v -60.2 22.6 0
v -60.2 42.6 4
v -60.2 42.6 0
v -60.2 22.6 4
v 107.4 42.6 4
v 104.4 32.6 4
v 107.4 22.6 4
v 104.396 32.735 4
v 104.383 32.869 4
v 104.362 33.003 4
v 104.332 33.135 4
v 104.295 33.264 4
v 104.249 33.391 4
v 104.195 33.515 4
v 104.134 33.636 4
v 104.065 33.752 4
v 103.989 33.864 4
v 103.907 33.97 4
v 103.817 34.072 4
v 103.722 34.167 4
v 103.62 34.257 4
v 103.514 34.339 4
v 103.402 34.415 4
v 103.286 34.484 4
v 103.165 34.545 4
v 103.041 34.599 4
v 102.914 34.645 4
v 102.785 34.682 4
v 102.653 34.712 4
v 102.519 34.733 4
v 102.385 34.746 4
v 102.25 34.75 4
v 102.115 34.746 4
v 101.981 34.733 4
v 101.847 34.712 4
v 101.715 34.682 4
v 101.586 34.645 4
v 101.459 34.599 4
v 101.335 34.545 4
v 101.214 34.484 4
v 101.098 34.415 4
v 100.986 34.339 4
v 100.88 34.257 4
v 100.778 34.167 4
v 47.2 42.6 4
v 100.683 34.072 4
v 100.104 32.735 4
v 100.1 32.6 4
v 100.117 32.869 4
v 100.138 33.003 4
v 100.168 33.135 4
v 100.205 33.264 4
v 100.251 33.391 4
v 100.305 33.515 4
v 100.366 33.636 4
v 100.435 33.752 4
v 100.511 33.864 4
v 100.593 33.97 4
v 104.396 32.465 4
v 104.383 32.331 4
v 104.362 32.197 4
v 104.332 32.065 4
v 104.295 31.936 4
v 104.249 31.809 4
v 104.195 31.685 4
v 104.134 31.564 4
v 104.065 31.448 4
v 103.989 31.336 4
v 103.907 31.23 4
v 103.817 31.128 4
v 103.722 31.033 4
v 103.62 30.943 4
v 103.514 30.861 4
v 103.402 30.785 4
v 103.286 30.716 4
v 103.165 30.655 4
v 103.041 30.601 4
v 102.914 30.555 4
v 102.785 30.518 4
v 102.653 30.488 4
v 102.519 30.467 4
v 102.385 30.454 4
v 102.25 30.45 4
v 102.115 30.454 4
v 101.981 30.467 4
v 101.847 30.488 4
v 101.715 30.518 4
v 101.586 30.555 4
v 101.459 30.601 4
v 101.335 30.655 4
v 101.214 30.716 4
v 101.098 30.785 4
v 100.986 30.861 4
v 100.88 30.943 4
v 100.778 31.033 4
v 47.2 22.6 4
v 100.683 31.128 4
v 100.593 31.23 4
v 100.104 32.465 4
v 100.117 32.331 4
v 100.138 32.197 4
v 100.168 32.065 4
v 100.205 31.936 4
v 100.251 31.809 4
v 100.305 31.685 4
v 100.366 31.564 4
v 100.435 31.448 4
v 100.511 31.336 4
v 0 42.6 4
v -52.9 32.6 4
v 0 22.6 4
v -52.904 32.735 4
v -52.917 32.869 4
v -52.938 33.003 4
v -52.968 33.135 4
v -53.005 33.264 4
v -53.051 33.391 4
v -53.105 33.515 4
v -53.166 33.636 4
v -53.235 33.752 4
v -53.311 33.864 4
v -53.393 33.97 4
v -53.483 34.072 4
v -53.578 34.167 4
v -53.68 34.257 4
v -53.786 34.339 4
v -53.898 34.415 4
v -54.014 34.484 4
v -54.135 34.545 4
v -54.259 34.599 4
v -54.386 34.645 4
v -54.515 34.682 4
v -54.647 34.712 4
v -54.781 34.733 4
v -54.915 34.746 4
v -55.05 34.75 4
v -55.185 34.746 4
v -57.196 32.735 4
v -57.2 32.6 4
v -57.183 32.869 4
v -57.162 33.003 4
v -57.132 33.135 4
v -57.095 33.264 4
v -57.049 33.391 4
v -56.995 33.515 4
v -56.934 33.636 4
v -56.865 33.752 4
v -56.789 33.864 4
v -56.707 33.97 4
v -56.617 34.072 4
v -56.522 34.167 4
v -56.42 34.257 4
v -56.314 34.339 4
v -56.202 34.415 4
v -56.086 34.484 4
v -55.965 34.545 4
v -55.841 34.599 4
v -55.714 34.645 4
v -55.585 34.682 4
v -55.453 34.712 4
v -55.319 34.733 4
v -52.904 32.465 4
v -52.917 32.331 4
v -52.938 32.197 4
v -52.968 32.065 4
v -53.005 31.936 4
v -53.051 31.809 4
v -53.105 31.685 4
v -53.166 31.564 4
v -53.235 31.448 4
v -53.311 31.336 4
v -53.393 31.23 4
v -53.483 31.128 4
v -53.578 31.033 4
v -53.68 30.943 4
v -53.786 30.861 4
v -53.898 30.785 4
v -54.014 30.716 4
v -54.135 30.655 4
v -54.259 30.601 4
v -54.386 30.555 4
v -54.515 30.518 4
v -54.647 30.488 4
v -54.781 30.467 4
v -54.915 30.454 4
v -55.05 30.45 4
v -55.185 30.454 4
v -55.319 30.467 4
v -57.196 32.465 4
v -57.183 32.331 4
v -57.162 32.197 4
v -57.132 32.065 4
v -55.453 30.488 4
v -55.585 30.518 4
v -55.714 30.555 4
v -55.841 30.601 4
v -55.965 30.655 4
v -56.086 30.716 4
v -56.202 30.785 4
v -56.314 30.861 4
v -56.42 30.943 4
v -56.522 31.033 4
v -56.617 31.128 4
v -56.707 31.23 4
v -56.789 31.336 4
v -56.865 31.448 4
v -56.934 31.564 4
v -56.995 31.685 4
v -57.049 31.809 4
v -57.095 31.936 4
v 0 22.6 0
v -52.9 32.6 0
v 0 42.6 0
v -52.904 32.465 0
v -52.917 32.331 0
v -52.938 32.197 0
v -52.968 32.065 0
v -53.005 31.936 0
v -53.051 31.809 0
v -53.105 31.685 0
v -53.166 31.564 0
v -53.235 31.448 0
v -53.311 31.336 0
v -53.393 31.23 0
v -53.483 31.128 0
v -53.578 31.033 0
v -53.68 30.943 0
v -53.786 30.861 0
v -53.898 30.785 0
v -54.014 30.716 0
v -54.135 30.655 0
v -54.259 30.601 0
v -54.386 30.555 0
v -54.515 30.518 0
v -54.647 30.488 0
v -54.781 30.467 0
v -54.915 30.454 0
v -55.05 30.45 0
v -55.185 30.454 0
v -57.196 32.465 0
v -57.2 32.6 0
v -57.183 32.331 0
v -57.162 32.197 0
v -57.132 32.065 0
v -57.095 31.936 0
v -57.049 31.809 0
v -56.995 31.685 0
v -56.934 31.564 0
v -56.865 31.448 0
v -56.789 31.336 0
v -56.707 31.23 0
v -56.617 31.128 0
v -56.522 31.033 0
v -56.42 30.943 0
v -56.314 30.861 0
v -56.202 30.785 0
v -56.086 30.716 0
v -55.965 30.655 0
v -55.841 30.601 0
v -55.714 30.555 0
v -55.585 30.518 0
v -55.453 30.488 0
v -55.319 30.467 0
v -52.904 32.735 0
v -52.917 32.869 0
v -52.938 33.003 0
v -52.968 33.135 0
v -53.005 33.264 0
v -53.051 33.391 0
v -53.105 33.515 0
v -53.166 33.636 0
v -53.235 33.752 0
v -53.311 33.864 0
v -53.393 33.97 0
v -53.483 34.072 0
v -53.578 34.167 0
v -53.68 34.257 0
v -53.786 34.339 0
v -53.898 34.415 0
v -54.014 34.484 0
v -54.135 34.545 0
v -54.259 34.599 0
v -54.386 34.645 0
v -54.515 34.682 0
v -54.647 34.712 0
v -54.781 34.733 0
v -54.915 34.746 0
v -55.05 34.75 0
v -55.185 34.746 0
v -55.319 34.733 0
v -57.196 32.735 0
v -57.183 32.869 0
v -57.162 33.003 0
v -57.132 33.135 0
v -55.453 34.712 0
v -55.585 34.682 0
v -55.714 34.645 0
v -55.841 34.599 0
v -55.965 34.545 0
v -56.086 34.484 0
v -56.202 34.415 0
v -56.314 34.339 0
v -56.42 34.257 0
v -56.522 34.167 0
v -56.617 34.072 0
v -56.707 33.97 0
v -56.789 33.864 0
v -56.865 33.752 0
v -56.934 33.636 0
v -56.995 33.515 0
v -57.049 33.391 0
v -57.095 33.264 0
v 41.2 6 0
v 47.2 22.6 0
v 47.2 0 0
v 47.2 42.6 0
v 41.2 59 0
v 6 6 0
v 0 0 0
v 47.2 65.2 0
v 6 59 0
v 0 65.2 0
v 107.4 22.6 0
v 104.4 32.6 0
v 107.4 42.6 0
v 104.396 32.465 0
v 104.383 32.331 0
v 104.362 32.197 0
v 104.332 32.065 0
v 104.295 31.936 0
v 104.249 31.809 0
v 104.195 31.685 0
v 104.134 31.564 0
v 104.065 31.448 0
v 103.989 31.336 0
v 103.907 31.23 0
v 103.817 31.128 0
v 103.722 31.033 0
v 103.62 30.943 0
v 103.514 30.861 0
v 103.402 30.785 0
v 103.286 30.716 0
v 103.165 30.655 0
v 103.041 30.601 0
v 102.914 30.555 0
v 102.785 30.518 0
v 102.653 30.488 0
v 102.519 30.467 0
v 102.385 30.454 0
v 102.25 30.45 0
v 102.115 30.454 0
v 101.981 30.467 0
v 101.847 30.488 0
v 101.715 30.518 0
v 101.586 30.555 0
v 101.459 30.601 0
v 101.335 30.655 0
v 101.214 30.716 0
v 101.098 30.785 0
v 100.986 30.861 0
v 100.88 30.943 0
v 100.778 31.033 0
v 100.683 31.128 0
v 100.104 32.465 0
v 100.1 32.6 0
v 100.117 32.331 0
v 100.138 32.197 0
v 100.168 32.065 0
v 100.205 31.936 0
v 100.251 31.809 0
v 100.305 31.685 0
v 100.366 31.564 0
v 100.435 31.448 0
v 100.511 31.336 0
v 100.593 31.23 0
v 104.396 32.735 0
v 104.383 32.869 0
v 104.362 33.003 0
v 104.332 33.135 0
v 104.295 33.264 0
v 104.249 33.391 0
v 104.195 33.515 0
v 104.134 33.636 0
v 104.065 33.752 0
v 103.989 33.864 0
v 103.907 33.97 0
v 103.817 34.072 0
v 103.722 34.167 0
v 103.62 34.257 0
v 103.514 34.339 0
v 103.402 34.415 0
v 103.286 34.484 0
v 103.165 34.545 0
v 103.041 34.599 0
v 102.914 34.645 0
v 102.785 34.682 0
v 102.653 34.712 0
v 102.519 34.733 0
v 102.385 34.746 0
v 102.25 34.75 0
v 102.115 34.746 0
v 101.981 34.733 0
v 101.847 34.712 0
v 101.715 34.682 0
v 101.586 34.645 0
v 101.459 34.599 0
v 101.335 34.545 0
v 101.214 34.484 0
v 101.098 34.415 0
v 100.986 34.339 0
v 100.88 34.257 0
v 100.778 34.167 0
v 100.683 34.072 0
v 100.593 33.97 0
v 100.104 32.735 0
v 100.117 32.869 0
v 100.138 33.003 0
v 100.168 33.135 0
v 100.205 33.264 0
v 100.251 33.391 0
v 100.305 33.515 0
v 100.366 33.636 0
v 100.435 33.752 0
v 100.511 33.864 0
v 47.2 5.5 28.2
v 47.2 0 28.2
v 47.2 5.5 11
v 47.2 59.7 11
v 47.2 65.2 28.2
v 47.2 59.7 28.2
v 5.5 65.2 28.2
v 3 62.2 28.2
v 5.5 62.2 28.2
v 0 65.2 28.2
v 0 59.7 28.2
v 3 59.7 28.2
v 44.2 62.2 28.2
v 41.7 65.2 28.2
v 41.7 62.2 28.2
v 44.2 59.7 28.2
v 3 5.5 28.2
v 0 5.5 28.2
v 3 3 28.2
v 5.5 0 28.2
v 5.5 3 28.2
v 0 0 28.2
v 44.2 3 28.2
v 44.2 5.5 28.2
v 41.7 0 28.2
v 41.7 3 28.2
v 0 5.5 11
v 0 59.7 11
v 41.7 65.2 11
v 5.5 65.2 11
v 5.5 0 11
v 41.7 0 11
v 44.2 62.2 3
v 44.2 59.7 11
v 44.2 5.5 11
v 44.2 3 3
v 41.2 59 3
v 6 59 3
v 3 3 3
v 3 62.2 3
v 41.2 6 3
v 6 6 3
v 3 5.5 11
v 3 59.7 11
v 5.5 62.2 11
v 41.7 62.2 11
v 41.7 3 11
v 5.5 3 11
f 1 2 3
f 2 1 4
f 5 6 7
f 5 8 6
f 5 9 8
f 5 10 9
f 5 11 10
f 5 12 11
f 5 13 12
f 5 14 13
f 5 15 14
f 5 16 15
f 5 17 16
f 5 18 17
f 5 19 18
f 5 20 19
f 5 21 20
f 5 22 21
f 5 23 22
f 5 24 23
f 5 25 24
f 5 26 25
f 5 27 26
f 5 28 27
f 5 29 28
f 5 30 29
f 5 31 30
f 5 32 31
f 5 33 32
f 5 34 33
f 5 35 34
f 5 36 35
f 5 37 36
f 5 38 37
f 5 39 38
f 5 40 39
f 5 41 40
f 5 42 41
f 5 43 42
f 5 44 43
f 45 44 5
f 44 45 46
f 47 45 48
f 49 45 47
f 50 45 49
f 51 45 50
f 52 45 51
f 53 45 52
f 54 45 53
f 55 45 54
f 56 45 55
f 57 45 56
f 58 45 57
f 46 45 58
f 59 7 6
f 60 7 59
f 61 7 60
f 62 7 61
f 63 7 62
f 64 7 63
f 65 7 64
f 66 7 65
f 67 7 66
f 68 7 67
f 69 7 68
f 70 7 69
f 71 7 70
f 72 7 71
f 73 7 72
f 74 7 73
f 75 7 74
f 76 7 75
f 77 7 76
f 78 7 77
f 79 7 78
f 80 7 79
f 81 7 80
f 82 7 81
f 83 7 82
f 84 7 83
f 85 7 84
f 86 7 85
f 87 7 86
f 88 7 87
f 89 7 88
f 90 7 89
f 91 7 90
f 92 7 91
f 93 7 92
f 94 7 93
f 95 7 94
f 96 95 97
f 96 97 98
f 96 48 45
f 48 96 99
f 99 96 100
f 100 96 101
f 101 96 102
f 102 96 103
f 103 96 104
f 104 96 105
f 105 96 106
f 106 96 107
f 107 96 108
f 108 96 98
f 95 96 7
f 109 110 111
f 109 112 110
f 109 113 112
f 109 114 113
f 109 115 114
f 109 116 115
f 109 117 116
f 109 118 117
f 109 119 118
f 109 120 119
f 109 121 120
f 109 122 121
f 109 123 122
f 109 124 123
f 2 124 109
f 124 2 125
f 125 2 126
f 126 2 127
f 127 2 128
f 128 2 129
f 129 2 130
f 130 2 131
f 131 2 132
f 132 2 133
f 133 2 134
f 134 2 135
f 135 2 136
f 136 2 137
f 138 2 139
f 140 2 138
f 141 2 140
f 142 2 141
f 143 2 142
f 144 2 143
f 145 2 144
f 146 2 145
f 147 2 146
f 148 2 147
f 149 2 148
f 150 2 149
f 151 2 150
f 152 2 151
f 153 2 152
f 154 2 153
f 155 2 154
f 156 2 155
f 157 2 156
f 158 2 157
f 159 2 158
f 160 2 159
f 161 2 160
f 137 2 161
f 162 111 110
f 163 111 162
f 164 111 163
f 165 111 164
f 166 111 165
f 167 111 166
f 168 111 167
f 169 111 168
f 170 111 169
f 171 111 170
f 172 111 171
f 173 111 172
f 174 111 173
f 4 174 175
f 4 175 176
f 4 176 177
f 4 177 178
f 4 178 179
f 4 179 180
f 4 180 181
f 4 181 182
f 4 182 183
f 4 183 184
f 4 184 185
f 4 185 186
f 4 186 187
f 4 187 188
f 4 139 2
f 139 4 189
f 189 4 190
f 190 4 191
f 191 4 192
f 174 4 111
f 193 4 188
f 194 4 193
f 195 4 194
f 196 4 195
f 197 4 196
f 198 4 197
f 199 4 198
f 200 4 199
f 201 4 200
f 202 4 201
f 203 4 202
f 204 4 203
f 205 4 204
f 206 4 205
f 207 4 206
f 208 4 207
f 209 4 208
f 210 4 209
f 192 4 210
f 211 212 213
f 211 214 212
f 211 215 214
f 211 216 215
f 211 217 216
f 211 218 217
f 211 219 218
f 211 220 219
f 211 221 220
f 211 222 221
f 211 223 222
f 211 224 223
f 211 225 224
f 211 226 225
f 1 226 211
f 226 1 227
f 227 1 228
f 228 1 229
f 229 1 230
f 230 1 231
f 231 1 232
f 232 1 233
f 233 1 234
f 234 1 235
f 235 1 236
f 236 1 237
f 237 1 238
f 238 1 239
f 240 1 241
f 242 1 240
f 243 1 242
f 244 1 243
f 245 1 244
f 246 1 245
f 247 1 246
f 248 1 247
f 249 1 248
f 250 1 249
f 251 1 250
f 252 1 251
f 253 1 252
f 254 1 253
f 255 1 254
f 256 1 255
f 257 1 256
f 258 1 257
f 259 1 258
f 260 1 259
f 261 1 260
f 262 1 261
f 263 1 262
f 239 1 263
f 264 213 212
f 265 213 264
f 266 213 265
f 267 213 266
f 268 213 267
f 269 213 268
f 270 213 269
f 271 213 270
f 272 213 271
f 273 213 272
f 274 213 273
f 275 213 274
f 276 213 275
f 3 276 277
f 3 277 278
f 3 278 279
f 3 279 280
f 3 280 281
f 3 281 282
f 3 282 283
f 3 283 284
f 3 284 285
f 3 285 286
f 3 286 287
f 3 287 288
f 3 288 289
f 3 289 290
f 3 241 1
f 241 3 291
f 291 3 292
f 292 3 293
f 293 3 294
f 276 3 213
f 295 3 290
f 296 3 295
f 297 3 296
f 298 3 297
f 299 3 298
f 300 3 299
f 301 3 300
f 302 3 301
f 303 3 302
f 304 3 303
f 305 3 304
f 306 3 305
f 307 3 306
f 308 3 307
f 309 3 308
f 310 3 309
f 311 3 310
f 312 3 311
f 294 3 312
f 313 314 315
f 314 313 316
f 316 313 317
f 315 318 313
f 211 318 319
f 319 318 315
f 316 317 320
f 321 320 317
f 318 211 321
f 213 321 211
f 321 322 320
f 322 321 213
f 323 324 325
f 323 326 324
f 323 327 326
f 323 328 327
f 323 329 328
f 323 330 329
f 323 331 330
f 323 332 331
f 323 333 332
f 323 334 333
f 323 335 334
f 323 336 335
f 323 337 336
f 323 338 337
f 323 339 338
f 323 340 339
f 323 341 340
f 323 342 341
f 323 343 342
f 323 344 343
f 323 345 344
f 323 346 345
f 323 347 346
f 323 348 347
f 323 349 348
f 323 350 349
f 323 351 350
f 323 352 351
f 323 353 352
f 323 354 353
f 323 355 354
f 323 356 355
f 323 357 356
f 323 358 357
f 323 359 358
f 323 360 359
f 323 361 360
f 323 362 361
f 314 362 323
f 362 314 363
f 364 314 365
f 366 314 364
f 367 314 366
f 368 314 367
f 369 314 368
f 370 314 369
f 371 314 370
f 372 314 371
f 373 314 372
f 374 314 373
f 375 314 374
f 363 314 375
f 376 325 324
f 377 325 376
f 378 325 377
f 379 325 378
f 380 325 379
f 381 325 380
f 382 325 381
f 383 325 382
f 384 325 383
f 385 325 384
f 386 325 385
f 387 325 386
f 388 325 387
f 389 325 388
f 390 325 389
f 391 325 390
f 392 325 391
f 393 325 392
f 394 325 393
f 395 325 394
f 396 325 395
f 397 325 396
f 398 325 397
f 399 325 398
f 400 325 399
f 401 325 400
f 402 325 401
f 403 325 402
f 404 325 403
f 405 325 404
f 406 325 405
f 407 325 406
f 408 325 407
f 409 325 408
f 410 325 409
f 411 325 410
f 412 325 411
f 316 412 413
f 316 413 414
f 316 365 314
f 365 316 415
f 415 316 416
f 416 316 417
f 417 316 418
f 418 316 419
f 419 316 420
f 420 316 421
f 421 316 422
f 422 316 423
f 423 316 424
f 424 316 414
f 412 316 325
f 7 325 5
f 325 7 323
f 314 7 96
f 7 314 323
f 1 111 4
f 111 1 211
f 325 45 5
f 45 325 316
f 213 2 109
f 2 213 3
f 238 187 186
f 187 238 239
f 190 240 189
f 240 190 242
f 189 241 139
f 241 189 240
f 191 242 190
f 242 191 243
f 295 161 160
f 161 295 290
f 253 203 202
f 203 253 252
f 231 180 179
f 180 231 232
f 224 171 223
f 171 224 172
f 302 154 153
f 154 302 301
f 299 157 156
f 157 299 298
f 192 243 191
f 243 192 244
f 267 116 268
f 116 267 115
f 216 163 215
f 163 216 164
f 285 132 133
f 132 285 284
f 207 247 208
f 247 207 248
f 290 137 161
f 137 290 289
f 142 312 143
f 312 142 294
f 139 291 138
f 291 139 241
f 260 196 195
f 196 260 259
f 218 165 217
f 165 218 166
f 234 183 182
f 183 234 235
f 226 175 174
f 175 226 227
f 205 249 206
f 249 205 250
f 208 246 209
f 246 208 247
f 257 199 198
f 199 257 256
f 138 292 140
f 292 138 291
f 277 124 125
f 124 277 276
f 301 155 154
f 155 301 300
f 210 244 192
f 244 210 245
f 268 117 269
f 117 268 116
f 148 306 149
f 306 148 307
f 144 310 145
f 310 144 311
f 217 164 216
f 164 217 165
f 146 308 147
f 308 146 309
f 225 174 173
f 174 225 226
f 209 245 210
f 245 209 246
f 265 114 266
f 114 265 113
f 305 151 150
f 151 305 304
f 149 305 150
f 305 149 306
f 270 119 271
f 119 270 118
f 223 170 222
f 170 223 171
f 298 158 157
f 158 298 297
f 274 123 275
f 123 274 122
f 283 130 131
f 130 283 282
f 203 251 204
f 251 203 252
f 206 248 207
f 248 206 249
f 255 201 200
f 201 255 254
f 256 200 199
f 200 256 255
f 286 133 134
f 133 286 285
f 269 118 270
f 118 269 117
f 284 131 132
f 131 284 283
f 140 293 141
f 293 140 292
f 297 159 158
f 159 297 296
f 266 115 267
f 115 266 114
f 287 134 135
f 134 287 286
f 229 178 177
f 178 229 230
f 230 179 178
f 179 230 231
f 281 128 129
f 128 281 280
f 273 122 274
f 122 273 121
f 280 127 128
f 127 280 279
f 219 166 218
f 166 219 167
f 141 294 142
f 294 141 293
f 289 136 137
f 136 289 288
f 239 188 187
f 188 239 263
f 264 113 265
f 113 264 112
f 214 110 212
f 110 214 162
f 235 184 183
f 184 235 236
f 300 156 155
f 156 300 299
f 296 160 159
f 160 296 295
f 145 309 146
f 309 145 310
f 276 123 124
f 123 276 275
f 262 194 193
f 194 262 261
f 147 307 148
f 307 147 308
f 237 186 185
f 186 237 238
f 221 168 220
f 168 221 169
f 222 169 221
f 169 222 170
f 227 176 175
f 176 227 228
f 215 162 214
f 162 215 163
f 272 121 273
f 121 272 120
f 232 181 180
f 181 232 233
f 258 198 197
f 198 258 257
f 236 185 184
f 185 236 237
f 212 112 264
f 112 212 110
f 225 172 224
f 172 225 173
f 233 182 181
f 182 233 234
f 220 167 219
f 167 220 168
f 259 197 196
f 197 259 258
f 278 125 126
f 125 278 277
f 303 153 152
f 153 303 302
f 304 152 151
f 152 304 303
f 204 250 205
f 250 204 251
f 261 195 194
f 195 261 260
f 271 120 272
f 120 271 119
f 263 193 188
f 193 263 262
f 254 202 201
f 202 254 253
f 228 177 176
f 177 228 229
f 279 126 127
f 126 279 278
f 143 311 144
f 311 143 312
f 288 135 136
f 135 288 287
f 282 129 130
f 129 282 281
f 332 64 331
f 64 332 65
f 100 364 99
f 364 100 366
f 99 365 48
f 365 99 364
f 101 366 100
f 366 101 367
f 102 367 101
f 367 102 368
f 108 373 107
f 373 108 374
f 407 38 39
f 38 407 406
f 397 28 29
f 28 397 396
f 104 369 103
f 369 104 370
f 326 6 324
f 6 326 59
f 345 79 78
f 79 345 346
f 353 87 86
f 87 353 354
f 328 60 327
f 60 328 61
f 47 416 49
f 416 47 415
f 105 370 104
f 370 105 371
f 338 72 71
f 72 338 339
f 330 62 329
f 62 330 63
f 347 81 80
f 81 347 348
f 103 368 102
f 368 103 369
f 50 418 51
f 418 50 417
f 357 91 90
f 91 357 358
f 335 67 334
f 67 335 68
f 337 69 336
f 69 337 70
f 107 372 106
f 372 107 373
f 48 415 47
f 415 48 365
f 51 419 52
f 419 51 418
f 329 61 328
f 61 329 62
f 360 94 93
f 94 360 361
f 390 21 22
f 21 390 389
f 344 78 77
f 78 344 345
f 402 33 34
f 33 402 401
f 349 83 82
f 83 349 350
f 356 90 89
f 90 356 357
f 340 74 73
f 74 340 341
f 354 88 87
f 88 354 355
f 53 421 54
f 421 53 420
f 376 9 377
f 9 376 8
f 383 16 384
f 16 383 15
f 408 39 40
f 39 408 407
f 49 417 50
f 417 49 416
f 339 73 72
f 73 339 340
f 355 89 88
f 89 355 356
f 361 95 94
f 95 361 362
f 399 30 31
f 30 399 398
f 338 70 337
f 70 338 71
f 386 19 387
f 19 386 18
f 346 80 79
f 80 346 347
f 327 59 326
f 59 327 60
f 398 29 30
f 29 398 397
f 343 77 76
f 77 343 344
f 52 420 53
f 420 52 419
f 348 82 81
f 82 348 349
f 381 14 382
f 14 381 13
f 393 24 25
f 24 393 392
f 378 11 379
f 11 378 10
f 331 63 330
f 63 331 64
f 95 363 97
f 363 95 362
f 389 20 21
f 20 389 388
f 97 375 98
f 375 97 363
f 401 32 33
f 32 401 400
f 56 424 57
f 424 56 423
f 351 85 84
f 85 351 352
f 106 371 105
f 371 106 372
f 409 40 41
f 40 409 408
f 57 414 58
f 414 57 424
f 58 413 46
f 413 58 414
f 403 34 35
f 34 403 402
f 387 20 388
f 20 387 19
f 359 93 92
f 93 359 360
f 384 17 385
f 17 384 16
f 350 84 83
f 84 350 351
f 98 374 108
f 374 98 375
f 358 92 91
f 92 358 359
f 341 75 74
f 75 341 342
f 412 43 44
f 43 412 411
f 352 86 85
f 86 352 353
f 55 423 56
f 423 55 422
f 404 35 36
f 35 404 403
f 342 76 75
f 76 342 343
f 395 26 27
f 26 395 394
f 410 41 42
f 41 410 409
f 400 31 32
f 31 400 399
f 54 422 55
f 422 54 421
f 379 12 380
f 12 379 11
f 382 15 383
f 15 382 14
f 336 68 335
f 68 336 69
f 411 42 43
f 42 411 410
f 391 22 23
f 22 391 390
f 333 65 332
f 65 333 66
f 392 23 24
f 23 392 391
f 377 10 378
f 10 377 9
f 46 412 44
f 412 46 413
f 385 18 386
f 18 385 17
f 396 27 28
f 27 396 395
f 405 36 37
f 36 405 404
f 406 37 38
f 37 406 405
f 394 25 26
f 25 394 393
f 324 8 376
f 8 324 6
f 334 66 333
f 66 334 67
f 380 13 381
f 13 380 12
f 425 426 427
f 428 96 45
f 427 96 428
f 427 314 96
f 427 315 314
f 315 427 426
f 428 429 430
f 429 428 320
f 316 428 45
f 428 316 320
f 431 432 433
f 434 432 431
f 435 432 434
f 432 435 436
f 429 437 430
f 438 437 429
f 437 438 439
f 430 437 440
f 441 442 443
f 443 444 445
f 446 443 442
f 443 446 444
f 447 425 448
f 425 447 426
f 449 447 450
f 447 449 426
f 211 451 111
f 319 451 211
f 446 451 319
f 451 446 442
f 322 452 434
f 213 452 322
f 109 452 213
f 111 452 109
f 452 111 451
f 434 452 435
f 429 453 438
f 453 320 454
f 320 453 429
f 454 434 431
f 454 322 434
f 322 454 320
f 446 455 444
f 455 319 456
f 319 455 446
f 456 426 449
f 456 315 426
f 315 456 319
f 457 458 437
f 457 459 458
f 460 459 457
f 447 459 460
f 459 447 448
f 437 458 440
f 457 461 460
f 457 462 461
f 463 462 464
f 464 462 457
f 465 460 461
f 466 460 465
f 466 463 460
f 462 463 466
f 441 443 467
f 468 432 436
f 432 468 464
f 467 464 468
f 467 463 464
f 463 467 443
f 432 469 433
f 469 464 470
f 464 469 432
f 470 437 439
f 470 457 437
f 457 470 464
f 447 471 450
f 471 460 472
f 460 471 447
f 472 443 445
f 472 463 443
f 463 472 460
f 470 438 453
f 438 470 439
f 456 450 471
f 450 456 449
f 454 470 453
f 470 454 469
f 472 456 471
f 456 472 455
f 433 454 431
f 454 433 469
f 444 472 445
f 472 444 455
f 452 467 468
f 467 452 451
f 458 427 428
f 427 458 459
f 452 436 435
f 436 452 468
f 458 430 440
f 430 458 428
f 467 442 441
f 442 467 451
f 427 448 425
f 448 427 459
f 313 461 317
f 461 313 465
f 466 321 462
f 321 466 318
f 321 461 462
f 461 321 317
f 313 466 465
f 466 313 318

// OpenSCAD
$fn = 100;
/*difference()
{
    cube([151+3+3.85+1+1+3.85+3,20,4]);

    translate([151+3+3.85+1+1+3.85/2,10,-1])
    {
        cylinder(h=6,d=3.85);
    }
    
    translate([3+3.85/2,10,-1])
    {
        cylinder(h=6,d=3.85);
    }
}*/
/*translate([3+3.85+1,10,2])
    cube([151,20,4]);*/
err = 0.2;
hs = 4.1+err;    
thk = 3;
union(){
    difference()
    {
        union()
        {
            translate([(151+3+hs+1+1+hs+3)/2+(41+thk*2+err)/2,10+(59+thk*2+err)/2,0])
            {
                rotate([0,0,90])
                {
                    rotate([0,0,90])
                    {
                        difference()
                        {
                            cube([151+3+hs+1+1+hs+3,20,4]);

                            translate([151+3+hs+1+1+hs/2,10,-1])
                            {
                                cylinder(h=6,d=hs);
                            }
                            
                            translate([3+hs/2,10,-1])
                            {
                                cylinder(h=6,d=hs);
                            }
                        }
                    }
                }
            }
            cube([41+thk*2+err,59+thk*2+err,25+thk+err]);
        }
        translate([thk,thk,thk])
            cube([41+err,59+err,25+thk+err+1]);
        translate([5.5,-1,thk+8])
            cube([41-5.5*2+thk*2+err,59+2+thk*2+err,25+thk*2+err]);
        translate([-1,5.5,thk+8])
            cube([41+2+thk*2+err,59-5.5*2+thk*2+err,25+thk*2+err]);
        translate([thk+3,thk+3,-1])
            cube([41-6+err,59-6,thk+2]);
    };
};    


        
